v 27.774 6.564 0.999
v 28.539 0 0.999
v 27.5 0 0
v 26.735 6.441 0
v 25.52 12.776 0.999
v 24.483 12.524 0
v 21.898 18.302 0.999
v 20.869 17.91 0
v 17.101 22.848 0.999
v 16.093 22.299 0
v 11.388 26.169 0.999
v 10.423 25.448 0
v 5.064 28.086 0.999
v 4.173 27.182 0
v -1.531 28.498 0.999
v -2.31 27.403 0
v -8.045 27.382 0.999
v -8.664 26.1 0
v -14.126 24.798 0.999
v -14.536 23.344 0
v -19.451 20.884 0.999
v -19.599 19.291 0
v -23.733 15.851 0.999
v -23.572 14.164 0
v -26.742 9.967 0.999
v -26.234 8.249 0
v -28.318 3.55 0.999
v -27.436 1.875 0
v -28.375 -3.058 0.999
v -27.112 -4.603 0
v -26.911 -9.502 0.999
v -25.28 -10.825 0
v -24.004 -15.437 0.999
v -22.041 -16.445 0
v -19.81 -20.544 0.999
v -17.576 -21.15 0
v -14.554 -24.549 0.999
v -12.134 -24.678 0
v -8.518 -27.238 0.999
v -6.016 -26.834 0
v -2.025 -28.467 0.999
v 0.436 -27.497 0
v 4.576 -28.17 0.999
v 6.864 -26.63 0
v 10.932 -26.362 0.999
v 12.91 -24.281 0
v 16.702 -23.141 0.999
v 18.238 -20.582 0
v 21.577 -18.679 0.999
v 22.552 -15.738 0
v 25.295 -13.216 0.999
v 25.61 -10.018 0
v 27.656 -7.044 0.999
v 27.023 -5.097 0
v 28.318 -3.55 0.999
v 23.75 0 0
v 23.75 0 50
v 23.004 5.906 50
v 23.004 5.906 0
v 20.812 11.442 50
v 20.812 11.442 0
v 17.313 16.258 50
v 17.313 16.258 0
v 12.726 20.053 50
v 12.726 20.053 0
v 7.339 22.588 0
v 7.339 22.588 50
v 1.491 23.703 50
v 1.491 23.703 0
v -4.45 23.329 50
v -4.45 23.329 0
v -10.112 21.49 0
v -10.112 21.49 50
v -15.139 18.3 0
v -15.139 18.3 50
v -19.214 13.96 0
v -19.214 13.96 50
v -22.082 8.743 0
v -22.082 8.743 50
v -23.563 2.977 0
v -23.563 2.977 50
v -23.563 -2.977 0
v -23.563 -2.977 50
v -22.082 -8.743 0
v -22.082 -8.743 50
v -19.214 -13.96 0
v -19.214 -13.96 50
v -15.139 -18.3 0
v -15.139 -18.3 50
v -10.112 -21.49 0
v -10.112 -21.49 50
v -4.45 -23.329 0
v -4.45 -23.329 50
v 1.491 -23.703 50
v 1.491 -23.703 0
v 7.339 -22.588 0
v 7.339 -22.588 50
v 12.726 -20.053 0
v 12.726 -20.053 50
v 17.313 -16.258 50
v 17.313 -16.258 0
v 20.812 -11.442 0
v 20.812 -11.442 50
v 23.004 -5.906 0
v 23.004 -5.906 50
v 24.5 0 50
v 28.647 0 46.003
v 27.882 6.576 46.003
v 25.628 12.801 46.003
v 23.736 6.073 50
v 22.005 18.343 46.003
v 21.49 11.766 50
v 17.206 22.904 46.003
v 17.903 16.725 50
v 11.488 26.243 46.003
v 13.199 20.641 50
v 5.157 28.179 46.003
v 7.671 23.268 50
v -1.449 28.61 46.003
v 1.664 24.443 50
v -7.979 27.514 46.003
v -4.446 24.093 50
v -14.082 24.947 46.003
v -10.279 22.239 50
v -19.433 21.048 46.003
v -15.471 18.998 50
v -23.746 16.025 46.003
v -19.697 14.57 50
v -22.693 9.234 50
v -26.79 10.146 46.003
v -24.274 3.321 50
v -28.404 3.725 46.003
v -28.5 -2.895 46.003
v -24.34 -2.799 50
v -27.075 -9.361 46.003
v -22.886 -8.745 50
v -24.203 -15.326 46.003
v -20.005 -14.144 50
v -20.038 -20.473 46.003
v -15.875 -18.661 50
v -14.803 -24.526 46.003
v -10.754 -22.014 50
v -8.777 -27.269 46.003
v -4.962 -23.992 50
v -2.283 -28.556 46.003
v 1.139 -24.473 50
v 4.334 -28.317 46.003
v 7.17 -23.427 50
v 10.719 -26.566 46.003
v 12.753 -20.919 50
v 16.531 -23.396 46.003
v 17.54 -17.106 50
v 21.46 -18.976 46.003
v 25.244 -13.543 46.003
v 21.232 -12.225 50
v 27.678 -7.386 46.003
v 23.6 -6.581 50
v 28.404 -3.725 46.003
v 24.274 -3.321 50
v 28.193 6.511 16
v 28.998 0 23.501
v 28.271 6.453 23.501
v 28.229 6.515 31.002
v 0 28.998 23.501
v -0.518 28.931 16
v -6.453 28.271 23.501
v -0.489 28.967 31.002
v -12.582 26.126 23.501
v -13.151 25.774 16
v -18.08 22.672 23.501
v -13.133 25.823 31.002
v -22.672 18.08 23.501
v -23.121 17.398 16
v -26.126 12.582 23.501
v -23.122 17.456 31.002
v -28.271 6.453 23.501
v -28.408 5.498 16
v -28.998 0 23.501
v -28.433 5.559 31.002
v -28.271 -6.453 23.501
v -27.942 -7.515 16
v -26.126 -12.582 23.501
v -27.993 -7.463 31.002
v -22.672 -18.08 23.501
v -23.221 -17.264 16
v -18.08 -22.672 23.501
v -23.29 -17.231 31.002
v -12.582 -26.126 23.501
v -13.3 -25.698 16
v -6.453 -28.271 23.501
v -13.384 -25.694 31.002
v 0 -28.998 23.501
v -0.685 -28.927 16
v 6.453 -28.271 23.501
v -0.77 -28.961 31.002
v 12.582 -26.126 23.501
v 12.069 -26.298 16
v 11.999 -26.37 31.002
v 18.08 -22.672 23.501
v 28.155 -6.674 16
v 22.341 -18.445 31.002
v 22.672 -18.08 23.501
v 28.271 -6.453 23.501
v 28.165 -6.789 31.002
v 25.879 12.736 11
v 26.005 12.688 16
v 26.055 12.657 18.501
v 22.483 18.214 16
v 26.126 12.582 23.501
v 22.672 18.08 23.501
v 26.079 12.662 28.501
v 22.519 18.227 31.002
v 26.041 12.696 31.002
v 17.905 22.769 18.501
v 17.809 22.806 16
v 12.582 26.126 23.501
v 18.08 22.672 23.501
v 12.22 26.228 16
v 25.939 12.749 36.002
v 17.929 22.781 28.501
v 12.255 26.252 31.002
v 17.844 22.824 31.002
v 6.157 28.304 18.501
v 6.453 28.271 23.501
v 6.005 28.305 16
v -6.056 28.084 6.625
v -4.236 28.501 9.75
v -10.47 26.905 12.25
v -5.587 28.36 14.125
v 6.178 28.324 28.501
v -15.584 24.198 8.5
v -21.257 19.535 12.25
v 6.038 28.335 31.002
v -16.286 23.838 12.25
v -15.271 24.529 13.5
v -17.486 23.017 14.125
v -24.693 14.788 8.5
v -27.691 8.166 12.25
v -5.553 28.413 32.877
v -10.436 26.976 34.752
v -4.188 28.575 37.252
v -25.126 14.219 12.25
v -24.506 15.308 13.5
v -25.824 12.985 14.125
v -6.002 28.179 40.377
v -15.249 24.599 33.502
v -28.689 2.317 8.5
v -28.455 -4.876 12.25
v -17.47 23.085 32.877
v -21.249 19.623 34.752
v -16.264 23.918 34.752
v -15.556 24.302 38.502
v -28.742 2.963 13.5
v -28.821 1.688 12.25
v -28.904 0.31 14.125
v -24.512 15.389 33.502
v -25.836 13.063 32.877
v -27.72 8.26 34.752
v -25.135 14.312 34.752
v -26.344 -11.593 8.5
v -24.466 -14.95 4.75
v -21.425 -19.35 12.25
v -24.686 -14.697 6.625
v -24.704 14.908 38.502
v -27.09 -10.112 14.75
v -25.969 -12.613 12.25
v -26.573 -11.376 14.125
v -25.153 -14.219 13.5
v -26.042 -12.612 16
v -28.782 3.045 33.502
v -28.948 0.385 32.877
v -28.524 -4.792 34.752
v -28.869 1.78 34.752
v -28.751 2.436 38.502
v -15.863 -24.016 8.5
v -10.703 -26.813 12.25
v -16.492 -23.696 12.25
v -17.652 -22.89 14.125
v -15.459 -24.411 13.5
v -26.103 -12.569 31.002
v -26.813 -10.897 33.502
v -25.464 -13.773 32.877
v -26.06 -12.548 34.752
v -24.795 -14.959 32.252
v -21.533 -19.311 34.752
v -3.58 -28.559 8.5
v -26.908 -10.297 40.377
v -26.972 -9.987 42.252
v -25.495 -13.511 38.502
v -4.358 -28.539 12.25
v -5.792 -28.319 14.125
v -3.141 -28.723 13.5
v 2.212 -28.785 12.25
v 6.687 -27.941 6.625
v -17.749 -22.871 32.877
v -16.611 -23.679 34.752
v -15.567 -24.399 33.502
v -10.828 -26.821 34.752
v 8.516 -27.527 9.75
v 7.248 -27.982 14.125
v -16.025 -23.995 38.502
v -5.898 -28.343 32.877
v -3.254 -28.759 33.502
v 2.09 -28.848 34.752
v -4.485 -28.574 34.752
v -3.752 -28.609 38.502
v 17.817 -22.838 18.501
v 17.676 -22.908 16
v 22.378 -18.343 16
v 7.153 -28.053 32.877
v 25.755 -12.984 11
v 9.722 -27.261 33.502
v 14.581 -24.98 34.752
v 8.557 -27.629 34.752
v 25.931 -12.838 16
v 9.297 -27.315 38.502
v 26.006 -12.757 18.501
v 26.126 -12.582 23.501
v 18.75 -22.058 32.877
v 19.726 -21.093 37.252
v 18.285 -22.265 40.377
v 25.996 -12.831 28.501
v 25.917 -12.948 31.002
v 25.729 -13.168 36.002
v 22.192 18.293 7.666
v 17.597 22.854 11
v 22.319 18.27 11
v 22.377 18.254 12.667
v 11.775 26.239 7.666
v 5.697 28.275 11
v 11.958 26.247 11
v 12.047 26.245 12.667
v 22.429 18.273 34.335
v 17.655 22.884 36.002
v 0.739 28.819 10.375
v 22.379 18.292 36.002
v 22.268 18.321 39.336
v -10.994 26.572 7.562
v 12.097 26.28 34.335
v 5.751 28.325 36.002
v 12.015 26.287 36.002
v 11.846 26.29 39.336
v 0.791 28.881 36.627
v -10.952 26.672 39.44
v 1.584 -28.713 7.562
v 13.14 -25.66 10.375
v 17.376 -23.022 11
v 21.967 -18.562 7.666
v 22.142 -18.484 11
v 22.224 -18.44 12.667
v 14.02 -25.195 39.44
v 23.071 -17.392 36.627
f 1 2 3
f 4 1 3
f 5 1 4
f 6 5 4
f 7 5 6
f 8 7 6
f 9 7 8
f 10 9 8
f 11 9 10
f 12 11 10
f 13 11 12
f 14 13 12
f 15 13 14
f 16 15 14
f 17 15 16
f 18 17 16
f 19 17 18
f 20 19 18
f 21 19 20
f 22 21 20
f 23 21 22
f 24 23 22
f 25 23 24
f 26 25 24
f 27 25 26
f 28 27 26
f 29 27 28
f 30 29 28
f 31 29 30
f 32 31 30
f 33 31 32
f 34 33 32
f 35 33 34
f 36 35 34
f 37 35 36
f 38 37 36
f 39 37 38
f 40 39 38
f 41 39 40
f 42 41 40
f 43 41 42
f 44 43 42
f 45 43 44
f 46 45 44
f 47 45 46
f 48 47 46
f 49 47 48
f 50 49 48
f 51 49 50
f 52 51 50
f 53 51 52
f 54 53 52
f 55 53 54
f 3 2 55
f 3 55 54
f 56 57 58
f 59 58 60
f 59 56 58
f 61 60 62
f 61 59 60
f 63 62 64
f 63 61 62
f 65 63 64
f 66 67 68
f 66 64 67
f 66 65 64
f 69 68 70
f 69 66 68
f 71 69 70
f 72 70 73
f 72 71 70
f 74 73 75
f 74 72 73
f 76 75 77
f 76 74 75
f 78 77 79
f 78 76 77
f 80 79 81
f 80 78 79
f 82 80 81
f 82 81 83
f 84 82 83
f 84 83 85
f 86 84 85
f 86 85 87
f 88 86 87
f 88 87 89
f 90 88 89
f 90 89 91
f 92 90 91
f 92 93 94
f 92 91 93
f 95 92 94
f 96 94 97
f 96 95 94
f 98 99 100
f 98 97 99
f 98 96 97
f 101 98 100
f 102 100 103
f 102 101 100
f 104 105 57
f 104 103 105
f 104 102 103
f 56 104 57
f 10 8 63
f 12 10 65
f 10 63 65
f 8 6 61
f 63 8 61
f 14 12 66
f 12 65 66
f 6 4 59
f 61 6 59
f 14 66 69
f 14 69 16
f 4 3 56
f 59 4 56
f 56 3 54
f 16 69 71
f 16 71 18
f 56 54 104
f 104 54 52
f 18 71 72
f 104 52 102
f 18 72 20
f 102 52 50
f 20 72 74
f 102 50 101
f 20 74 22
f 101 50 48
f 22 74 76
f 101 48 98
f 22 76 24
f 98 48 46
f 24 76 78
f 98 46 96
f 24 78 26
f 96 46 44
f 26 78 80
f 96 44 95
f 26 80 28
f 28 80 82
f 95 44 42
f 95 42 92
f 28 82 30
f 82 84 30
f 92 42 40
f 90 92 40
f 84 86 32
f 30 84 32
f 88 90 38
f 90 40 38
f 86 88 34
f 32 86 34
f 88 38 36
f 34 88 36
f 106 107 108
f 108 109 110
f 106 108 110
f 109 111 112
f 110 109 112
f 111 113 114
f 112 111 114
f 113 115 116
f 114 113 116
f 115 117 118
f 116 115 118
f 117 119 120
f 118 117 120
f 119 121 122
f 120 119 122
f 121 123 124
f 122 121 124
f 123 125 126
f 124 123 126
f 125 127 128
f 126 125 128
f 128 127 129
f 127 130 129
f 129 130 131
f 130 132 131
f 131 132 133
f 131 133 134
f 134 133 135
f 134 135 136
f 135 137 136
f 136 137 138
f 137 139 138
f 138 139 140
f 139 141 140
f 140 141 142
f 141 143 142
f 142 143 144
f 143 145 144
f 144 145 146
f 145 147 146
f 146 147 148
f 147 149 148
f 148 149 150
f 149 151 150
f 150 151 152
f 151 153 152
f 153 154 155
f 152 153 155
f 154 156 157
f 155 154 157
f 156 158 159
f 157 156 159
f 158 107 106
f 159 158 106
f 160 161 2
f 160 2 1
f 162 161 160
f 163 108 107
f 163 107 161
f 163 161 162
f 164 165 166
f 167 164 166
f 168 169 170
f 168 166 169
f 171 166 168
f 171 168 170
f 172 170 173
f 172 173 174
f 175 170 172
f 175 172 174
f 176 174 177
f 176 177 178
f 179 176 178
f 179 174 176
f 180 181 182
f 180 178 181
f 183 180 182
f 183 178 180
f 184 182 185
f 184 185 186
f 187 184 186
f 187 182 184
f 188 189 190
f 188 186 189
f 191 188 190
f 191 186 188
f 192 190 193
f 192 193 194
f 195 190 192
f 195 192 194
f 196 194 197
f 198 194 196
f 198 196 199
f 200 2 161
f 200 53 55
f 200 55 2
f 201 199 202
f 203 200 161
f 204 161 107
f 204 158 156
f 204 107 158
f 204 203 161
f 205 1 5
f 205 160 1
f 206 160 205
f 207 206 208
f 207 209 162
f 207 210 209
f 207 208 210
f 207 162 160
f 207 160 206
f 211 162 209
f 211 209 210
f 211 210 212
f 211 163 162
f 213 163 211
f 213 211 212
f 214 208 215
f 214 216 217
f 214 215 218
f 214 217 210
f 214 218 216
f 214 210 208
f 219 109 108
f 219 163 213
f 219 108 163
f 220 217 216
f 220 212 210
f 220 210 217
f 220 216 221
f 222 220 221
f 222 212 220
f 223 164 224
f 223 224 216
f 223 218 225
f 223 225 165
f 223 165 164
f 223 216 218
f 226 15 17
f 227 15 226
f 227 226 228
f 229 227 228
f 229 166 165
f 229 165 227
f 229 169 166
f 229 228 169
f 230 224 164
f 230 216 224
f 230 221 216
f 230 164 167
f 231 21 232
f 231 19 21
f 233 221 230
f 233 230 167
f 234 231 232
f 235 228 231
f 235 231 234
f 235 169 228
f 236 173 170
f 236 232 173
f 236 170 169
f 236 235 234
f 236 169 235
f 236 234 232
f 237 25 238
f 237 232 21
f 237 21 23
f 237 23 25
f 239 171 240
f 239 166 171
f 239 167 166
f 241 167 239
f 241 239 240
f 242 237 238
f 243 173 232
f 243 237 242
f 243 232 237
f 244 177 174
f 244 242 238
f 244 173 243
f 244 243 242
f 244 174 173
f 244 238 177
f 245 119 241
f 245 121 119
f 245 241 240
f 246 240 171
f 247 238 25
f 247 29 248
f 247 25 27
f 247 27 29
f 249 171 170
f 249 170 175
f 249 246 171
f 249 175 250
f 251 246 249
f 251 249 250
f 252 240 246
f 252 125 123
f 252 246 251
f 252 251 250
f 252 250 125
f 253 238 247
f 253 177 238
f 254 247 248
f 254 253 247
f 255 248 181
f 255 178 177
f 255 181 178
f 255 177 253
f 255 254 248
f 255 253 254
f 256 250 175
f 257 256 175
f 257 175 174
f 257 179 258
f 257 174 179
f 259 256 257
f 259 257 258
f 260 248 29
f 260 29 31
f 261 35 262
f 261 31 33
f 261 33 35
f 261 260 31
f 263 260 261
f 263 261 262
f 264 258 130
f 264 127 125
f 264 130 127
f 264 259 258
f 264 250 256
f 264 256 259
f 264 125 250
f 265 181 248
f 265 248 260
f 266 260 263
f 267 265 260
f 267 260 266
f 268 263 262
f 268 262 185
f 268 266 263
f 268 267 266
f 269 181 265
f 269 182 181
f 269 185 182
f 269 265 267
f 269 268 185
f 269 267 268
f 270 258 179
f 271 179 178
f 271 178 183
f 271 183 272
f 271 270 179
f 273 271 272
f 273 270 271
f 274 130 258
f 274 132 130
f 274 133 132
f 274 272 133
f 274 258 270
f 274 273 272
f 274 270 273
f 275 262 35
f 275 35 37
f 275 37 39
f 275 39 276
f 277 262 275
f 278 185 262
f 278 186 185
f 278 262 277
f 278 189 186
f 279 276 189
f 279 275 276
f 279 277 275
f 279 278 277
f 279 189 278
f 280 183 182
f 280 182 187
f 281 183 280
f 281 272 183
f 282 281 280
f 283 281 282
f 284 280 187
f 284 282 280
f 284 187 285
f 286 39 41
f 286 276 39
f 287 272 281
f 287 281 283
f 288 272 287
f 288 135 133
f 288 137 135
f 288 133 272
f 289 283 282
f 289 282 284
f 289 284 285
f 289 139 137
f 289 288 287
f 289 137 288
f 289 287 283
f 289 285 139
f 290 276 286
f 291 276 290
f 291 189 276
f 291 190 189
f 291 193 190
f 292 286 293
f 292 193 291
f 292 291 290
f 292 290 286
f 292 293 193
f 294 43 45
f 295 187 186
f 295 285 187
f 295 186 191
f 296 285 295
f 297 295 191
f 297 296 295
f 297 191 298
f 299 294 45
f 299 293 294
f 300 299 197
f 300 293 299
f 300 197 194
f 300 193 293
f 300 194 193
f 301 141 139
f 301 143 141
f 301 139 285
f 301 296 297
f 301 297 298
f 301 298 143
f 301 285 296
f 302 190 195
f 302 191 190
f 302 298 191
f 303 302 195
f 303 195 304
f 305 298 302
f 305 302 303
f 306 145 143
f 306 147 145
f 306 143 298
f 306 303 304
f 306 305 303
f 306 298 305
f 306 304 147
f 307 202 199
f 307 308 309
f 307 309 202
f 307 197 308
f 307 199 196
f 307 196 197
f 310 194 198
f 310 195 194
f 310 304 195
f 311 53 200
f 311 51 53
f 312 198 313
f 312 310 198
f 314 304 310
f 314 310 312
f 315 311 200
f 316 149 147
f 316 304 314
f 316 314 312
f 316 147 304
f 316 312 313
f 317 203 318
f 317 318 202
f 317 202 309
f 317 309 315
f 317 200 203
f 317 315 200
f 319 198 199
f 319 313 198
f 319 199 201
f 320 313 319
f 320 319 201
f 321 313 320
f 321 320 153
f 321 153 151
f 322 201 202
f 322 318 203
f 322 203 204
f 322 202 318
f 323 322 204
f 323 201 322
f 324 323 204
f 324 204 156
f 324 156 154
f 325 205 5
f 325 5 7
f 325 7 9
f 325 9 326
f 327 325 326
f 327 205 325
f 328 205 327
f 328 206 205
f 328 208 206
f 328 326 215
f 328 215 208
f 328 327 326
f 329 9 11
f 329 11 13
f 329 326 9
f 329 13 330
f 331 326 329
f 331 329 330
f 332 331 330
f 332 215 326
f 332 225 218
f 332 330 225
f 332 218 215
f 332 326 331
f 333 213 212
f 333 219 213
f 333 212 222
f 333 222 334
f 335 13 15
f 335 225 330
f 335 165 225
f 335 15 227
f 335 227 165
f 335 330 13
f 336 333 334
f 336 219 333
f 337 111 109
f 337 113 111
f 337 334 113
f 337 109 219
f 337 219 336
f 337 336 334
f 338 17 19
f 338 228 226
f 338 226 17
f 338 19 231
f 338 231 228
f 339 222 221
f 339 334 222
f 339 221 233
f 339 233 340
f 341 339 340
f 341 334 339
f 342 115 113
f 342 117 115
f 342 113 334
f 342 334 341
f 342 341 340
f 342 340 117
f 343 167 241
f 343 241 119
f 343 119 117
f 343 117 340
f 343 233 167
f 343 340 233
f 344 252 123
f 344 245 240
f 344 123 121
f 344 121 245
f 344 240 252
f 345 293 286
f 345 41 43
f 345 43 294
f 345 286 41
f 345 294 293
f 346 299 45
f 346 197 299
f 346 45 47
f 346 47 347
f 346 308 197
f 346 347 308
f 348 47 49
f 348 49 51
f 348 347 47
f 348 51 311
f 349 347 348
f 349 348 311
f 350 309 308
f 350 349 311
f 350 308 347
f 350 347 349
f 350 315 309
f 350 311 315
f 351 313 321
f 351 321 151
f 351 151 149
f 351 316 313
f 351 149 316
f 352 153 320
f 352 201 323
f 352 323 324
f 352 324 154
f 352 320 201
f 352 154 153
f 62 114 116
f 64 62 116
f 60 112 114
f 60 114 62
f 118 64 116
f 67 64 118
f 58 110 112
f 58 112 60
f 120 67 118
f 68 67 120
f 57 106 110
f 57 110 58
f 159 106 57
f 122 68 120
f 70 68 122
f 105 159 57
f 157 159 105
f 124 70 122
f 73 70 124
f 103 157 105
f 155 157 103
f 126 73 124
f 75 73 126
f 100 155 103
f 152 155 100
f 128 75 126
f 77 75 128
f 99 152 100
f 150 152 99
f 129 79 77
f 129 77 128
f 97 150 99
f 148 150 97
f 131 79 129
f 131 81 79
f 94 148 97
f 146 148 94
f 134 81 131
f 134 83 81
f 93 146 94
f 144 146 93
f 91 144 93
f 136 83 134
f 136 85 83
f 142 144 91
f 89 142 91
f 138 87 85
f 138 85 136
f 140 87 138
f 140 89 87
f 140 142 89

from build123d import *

# Parameters (mm, degrees)
SKETCH_R        = 28.5
SKETCH001_R     = 29
SKETCH002_R     = 28.5
SKETCH003_R     = 23.75
POCKET_DEPTH    = 50.001
CHAMFER_SIZE    = 4
CHAMFER001_SIZE = 1


with BuildPart() as part:
    # Sketch → AdditiveLoft section 0
    with BuildSketch(Plane.XY):
        Circle(SKETCH_R)
    # Sketch001 → AdditiveLoft section 1
    with BuildSketch(Plane.XY.offset(25)):
        Circle(SKETCH001_R)
    # Sketch002 → AdditiveLoft section 2
    with BuildSketch(Plane.XY.offset(50)):
        Circle(SKETCH002_R)
    loft()

    # Sketch003 → Pocket (cut, through all)
    with BuildSketch(Plane.XY):
        Circle(SKETCH003_R)
    extrude(amount=POCKET_DEPTH, mode=Mode.SUBTRACT)

    # Chamfer
    chamfer_edges = [part.edges().sort_by_distance(p)[0] for p in [
        (-28.5, 0, 50),
    ]]
    chamfer(chamfer_edges, length=CHAMFER_SIZE)

    # Chamfer001
    chamfer001_edges = [part.edges().sort_by_distance(p)[0] for p in [
        (-28.5, 0, 0),
    ]]
    chamfer(chamfer001_edges, length=CHAMFER001_SIZE)


solid = part.part
